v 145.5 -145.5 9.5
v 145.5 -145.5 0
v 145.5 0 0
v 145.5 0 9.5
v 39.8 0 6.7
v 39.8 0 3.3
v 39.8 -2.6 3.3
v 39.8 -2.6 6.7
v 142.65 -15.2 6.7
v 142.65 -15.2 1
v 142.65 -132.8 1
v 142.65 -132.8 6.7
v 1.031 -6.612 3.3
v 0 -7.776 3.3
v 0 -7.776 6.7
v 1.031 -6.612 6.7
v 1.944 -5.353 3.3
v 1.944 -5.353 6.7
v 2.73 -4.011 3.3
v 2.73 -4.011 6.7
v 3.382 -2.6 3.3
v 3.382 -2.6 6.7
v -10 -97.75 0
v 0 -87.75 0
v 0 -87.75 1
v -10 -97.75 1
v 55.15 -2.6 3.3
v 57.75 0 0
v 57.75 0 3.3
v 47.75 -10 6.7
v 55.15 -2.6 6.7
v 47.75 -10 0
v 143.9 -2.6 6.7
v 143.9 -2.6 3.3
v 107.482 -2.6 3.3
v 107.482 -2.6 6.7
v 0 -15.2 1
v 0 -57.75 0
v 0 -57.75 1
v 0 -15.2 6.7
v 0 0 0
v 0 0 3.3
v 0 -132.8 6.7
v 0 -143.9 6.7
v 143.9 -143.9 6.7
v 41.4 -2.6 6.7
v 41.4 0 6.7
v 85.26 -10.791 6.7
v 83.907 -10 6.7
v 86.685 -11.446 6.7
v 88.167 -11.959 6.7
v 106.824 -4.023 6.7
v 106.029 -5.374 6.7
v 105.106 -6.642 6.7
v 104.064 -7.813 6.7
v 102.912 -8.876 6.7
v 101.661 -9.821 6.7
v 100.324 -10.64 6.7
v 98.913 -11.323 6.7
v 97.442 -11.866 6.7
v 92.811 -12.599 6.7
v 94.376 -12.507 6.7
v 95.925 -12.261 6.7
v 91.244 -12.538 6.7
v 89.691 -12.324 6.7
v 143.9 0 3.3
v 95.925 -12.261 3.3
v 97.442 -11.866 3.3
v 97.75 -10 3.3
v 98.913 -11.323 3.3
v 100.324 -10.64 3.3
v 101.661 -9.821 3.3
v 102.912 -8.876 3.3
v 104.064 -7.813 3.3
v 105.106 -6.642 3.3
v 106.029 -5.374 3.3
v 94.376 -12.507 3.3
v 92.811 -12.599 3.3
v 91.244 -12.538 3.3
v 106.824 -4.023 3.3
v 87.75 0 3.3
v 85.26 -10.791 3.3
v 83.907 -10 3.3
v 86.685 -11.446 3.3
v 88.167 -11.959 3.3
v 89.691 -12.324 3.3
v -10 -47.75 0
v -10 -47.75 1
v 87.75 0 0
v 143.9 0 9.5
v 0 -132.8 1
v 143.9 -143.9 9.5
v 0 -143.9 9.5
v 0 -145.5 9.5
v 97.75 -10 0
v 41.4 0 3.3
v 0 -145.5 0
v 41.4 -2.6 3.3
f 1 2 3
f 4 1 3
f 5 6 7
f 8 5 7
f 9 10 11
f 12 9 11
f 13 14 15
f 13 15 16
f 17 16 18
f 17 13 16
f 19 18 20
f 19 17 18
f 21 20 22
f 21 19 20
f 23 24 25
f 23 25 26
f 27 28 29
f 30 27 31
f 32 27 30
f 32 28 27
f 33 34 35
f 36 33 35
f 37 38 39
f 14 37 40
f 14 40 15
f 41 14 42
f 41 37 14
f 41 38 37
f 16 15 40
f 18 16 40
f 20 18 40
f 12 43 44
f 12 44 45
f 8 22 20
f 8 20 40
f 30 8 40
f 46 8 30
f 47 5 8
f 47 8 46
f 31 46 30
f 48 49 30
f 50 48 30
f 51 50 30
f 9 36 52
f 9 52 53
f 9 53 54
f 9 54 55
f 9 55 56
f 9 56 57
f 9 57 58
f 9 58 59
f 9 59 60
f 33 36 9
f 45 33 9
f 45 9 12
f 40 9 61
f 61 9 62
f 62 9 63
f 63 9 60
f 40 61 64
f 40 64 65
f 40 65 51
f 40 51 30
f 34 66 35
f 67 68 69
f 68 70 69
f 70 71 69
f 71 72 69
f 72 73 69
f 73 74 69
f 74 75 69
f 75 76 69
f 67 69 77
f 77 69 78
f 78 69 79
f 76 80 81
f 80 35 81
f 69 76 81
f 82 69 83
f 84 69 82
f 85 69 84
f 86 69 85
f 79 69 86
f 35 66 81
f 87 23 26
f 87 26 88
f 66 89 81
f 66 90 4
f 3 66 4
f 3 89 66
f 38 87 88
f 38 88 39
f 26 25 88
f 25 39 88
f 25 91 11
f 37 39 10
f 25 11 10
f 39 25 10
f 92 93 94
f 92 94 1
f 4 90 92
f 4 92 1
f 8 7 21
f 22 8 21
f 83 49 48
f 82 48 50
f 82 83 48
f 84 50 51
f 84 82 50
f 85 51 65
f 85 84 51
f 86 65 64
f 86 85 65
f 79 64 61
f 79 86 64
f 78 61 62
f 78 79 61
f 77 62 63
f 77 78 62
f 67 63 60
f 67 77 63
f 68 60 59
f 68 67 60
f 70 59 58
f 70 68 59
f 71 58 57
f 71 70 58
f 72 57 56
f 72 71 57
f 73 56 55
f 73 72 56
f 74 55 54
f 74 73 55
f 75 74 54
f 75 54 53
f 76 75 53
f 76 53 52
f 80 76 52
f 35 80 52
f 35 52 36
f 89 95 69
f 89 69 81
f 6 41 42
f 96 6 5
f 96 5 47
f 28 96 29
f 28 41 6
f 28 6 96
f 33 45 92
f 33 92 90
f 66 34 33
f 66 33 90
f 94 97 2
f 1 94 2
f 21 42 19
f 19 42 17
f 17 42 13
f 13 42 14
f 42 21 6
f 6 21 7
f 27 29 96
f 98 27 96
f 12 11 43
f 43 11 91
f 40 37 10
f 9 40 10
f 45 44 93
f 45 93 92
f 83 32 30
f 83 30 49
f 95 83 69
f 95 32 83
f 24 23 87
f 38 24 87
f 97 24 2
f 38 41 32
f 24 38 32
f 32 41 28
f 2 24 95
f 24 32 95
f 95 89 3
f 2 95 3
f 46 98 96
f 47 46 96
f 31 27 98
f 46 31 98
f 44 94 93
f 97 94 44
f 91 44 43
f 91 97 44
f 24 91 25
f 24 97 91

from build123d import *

# Parameters (mm, degrees)
PAD019_DEPTH            = 6.2
SKETCH044_W             = 187.5
SKETCH044_H             = 187.5
PAD020_DEPTH            = 2.8
PAD021_DEPTH            = 8.5
BODY021_PLACEMENT_ANGLE = 90
PAD022_DEPTH            = 6.2
BODY023_PLACEMENT_ANGLE = 180
PAD028_DEPTH            = 2.3
PAD029_DEPTH            = 2.3
PAD030_DEPTH            = 2.3
PAD031_DEPTH            = 2.3
PAD032_DEPTH            = 2.3
PAD033_DEPTH            = 2.3
PAD034_DEPTH            = 8.5
SKETCH046_W             = 291
SKETCH046_H             = 291
PAD027_DEPTH            = 9.5
POCKET044_DEPTH         = 9.501


with BuildPart() as playercardstack1:
    # Sketch043 → Pad019 (new body)
    with BuildSketch(Plane.XY):
        with BuildLine():
            Line((-51.25, 73.5), (51.25, 73.5))
            Line((51.25, 73.5), (51.25, -73.5))
            Line((51.25, -73.5), (14.832397, -73.5))
            ThreePointArc((-14.832397, -73.5), (0, -83.5), (14.832397, -73.5))
            Line((-14.832397, -73.5), (-51.25, -73.5))
            Line((-51.25, -73.5), (-51.25, 73.5))
        make_face()
    extrude(amount=PAD019_DEPTH)


with BuildPart() as playercardstack1_1:
    # Body019 placement: moved
    add(playercardstack1.part.moved(Location((92.65, 70.9, 3.3))))


with BuildPart() as xitech:
    # Sketch044 → Pad020 (new body)
    with BuildSketch(Plane.XY):
        Rectangle(SKETCH044_W, SKETCH044_H)
    extrude(amount=PAD020_DEPTH)


with BuildPart() as xitech_1:
    # Body020 placement: moved
    add(xitech.part.moved(Location((50.15, -50.15, 6.7))))


with BuildPart() as xiboardfold:
    # Sketch045 → Pad021 (new body)
    with BuildSketch(Plane.XY):
        with BuildLine():
            Line((-58.8, 92.5), (58.8, 92.5))
            Line((58.8, 92.5), (58.8, -92.5))
            Line((58.8, -92.5), (17, -92.5))
            ThreePointArc((-17, -92.5), (0, -109.5), (17, -92.5))
            Line((-17, -92.5), (-58.8, -92.5))
            Line((-58.8, -92.5), (-58.8, 92.5))
        make_face()
    extrude(amount=PAD021_DEPTH)


with BuildPart() as xiboardfold_1:
    # Body021 placement: moved
    add(xiboardfold.part.moved(Location((50.15, -74, 1))).rotate(Axis((50.15, -74, 1), (0, 0, -1)), BODY021_PLACEMENT_ANGLE))


with BuildPart() as playercardstack2:
    # Sketch047 → Pad022 (new body)
    with BuildSketch(Plane.XY):
        with BuildLine():
            Line((-51.25, 73.5), (-14.832397, 73.5))
            ThreePointArc((14.832397, 73.5), (0, 83.5), (-14.832397, 73.5))
            Line((14.832397, 73.5), (51.25, 73.5))
            Line((51.25, 73.5), (51.25, -73.5))
            Line((51.25, -73.5), (-51.25, -73.5))
            Line((-51.25, -73.5), (-51.25, 73.5))
        make_face()
    extrude(amount=PAD022_DEPTH)


with BuildPart() as playercardstack2_1:
    # Body023 placement: moved
    add(playercardstack2.part.moved(Location((-11.45, 70.9, 3.3))).rotate(Axis((-11.45, 70.9, 3.3), (0, 0, 1)), BODY023_PLACEMENT_ANGLE))


with BuildPart() as alliancetokens1:
    # Sketch054 → Pad028 (new body)
    with BuildSketch(Plane.XY):
        with BuildLine():
            ThreePointArc((8.5, -8.5), (24.025463, -17.7), (39.550926, -8.5))
            Line((51.25, -8.5), (39.550926, -8.5))
            Line((51.25, 8.5), (51.25, -8.5))
            Line((39.550926, 8.5), (51.25, 8.5))
            ThreePointArc((39.550926, 8.5), (24.025463, 17.7), (8.5, 8.5))
            Line((8.5, 8.5), (-8.5, 8.5))
            ThreePointArc((-8.5, 8.5), (-24.025463, 17.7), (-39.550926, 8.5))
            Line((-39.550926, 8.5), (-51.25, 8.5))
            Line((-51.25, 8.5), (-51.25, -8.5))
            Line((-51.25, -8.5), (-39.550926, -8.5))
            ThreePointArc((-39.550926, -8.5), (-24.025463, -17.7), (-8.5, -8.5))
            Line((8.5, -8.5), (-8.5, -8.5))
        make_face()
    extrude(amount=PAD028_DEPTH)


with BuildPart() as alliancetokens1_1:
    # Body028 placement: moved
    add(alliancetokens1.part.moved(Location((92.65, 106.5, 1))))


with BuildPart() as alliancetokens2:
    # Sketch055 → Pad029 (new body)
    with BuildSketch(Plane.XY):
        with BuildLine():
            ThreePointArc((8.5, -8.5), (24.025463, -17.7), (39.550926, -8.5))
            Line((51.25, -8.5), (39.550926, -8.5))
            Line((51.25, 8.5), (51.25, -8.5))
            Line((39.550926, 8.5), (51.25, 8.5))
            ThreePointArc((39.550926, 8.5), (24.025463, 17.7), (8.5, 8.5))
            Line((8.5, 8.5), (-8.5, 8.5))
            ThreePointArc((-8.5, 8.5), (-24.025463, 17.7), (-39.550926, 8.5))
            Line((-39.550926, 8.5), (-51.25, 8.5))
            Line((-51.25, 8.5), (-51.25, -8.5))
            Line((-51.25, -8.5), (-39.550926, -8.5))
            ThreePointArc((-39.550926, -8.5), (-24.025463, -17.7), (-8.5, -8.5))
            Line((8.5, -8.5), (-8.5, -8.5))
        make_face()
    extrude(amount=PAD029_DEPTH)


with BuildPart() as alliancetokens2_1:
    # Body029 placement: moved
    add(alliancetokens2.part.moved(Location((-11.45, 106.5, 1))))


with BuildPart() as htoken1:
    # Sketch056 → Pad030 (new body)
    with BuildSketch(Plane.XY):
        Polygon((-39.5, 8.5), (-51.25, 8.5), (-51.25, -8.5), (-39.5, -8.5), (-39.5, -15.5), (-8.5, -15.5), (-8.5, -8.5), (8.5, -8.5), (8.5, -15.5), (39.5, -15.5), (39.5, -8.5), (51.25, -8.5), (51.25, 8.5), (39.5, 8.5), (39.5, 15.5), (8.5, 15.5), (8.5, 8.5), (-8.5, 8.5), (-8.5, 15.5), (-39.5, 15.5), align=None)
    extrude(amount=PAD030_DEPTH)


with BuildPart() as htoken1_1:
    # Body030 placement: moved
    add(htoken1.part.moved(Location((92.65, 66.7, 1))))


with BuildPart() as htoken2:
    # Sketch057 → Pad031 (new body)
    with BuildSketch(Plane.XY):
        Polygon((-39.5, 8.5), (-51.25, 8.5), (-51.25, -8.5), (-39.5, -8.5), (-39.5, -15.5), (-8.5, -15.5), (-8.5, -8.5), (8.5, -8.5), (8.5, -15.5), (39.5, -15.5), (39.5, -8.5), (51.25, -8.5), (51.25, 8.5), (39.5, 8.5), (39.5, 15.5), (8.5, 15.5), (8.5, 8.5), (-8.5, 8.5), (-8.5, 15.5), (-39.5, 15.5), align=None)
    extrude(amount=PAD031_DEPTH)


with BuildPart() as htoken2_1:
    # Body031 placement: moved
    add(htoken2.part.moved(Location((-11.45, 66.7, 1))))


with BuildPart() as fptoken:
    # Sketch058 → Pad032 (new body)
    with BuildSketch(Plane.XY):
        with BuildLine():
            Line((-19.965971, 8.5), (-36.965971, 8.5))
            Line((-36.965971, 8.5), (-36.965971, -8.5))
            Line((-36.965971, -8.5), (-19.965971, -8.5))
            ThreePointArc((-19.965971, -8.5), (0, -21.7), (19.965971, -8.5))
            Line((36.965971, -8.5), (19.965971, -8.5))
            Line((36.965971, 8.5), (36.965971, -8.5))
            Line((19.965971, 8.5), (36.965971, 8.5))
            ThreePointArc((19.965971, 8.5), (0, 21.7), (-19.965971, 8.5))
        make_face()
    extrude(amount=PAD032_DEPTH)


with BuildPart() as fptoken_1:
    # Body032 placement: moved
    add(fptoken.part.moved(Location((92.65, 22.7, 1))))


with BuildPart() as fptoken2:
    # Sketch059 → Pad033 (new body)
    with BuildSketch(Plane.XY):
        Polygon((-28.5, 8.5), (-38.5, 8.5), (-38.5, -8.5), (-28.5, -8.5), (-28.5, -15), (28.5, -15), (28.5, -8.5), (38.5, -8.5), (38.5, 8.5), (28.5, 8.5), (28.5, 15), (-28.5, 15), align=None)
    extrude(amount=PAD033_DEPTH)


with BuildPart() as fptoken2_1:
    # Body033 placement: moved
    add(fptoken2.part.moved(Location((-11.45, 22.7, 1))))


with BuildPart() as faceupimperiumcards:
    # Sketch060 → Pad034 (new body)
    with BuildSketch(Plane.XY):
        with BuildLine():
            Line((-33.75, 143.9), (33.75, 143.9))
            Line((33.75, 143.9), (33.75, 51.4))
            Line((33.75, 51.4), (10, 51.4))
            ThreePointArc((10, 51.4), (7.425, 48.825), (10, 46.25))
            Line((10, 46.25), (33.75, 46.25))
            Line((33.75, 46.25), (33.75, -46.25))
            Line((33.75, -46.25), (10, -46.25))
            ThreePointArc((10, -46.25), (7.425, -48.825), (10, -51.4))
            Line((10, -51.4), (33.75, -51.4))
            Line((33.75, -51.4), (33.75, -143.9))
            Line((33.75, -143.9), (-33.75, -143.9))
            Line((-33.75, -143.9), (-33.75, -113.555974))
            ThreePointArc((-33.75, -81.744026), (-44.75, -97.65), (-33.75, -113.555974))
            Line((-33.75, -81.744026), (-33.75, -51.4))
            Line((-33.75, -51.4), (-10, -51.4))
            ThreePointArc((-10, -51.4), (-7.425, -48.825), (-10, -46.25))
            Line((-10, -46.25), (-33.75, -46.25))
            Line((-33.75, -46.25), (-33.75, -15.905974))
            ThreePointArc((-33.75, 15.905974), (-44.75, 0), (-33.75, -15.905974))
            Line((-33.75, 15.905974), (-33.75, 46.25))
            Line((-33.75, 46.25), (-10, 46.25))
            ThreePointArc((-10, 46.25), (-7.425, 48.825), (-10, 51.4))
            Line((-10, 51.4), (-33.75, 51.4))
            Line((-33.75, 51.4), (-33.75, 81.744026))
            ThreePointArc((-33.75, 113.555974), (-44.75, 97.65), (-33.75, 81.744026))
            Line((-33.75, 113.555974), (-33.75, 143.9))
        make_face()
    extrude(amount=PAD034_DEPTH)


with BuildPart() as faceupimperiumcards_1:
    # Body034 placement: moved
    add(faceupimperiumcards.part.moved(Location((-99.15, 0, 1))))


with BuildPart() as topinsert:
    # Sketch046 → Pad027 (new body)
    with BuildSketch(Plane.XY):
        Rectangle(SKETCH046_W, SKETCH046_H)
    extrude(amount=PAD027_DEPTH)

    # Boolean: cut PlayerCardStack1, XiTech, XiBoardFold, PlayerCardStack2, AllianceTokens1, AllianceTokens2, HToken1, HToken2, FPToken, FPToken2, FaceupImperiumCards
    add(playercardstack1_1.part, mode=Mode.SUBTRACT)
    add(xitech_1.part, mode=Mode.SUBTRACT)
    add(xiboardfold_1.part, mode=Mode.SUBTRACT)
    add(playercardstack2_1.part, mode=Mode.SUBTRACT)
    add(alliancetokens1_1.part, mode=Mode.SUBTRACT)
    add(alliancetokens2_1.part, mode=Mode.SUBTRACT)
    add(htoken1_1.part, mode=Mode.SUBTRACT)
    add(htoken2_1.part, mode=Mode.SUBTRACT)
    add(fptoken_1.part, mode=Mode.SUBTRACT)
    add(fptoken2_1.part, mode=Mode.SUBTRACT)
    add(faceupimperiumcards_1.part, mode=Mode.SUBTRACT)

    # Sketch123 → Pocket044 (cut, through all)
    with BuildSketch(Plane.XY):
        Polygon((-145.5, 145.5), (-145.5, 0), (-145.5, -145.5), (0, -145.5), (0, -87.75), (-10, -97.75), (-10, -47.75), (0, -57.75), (0, 0), (57.75, 0), (47.75, -10), (97.75, -10), (87.75, 0), (145.5, 0), (145.5, 145.5), (0, 145.5), align=None)
    extrude(amount=POCKET044_DEPTH, mode=Mode.SUBTRACT)


solid = topinsert.part
